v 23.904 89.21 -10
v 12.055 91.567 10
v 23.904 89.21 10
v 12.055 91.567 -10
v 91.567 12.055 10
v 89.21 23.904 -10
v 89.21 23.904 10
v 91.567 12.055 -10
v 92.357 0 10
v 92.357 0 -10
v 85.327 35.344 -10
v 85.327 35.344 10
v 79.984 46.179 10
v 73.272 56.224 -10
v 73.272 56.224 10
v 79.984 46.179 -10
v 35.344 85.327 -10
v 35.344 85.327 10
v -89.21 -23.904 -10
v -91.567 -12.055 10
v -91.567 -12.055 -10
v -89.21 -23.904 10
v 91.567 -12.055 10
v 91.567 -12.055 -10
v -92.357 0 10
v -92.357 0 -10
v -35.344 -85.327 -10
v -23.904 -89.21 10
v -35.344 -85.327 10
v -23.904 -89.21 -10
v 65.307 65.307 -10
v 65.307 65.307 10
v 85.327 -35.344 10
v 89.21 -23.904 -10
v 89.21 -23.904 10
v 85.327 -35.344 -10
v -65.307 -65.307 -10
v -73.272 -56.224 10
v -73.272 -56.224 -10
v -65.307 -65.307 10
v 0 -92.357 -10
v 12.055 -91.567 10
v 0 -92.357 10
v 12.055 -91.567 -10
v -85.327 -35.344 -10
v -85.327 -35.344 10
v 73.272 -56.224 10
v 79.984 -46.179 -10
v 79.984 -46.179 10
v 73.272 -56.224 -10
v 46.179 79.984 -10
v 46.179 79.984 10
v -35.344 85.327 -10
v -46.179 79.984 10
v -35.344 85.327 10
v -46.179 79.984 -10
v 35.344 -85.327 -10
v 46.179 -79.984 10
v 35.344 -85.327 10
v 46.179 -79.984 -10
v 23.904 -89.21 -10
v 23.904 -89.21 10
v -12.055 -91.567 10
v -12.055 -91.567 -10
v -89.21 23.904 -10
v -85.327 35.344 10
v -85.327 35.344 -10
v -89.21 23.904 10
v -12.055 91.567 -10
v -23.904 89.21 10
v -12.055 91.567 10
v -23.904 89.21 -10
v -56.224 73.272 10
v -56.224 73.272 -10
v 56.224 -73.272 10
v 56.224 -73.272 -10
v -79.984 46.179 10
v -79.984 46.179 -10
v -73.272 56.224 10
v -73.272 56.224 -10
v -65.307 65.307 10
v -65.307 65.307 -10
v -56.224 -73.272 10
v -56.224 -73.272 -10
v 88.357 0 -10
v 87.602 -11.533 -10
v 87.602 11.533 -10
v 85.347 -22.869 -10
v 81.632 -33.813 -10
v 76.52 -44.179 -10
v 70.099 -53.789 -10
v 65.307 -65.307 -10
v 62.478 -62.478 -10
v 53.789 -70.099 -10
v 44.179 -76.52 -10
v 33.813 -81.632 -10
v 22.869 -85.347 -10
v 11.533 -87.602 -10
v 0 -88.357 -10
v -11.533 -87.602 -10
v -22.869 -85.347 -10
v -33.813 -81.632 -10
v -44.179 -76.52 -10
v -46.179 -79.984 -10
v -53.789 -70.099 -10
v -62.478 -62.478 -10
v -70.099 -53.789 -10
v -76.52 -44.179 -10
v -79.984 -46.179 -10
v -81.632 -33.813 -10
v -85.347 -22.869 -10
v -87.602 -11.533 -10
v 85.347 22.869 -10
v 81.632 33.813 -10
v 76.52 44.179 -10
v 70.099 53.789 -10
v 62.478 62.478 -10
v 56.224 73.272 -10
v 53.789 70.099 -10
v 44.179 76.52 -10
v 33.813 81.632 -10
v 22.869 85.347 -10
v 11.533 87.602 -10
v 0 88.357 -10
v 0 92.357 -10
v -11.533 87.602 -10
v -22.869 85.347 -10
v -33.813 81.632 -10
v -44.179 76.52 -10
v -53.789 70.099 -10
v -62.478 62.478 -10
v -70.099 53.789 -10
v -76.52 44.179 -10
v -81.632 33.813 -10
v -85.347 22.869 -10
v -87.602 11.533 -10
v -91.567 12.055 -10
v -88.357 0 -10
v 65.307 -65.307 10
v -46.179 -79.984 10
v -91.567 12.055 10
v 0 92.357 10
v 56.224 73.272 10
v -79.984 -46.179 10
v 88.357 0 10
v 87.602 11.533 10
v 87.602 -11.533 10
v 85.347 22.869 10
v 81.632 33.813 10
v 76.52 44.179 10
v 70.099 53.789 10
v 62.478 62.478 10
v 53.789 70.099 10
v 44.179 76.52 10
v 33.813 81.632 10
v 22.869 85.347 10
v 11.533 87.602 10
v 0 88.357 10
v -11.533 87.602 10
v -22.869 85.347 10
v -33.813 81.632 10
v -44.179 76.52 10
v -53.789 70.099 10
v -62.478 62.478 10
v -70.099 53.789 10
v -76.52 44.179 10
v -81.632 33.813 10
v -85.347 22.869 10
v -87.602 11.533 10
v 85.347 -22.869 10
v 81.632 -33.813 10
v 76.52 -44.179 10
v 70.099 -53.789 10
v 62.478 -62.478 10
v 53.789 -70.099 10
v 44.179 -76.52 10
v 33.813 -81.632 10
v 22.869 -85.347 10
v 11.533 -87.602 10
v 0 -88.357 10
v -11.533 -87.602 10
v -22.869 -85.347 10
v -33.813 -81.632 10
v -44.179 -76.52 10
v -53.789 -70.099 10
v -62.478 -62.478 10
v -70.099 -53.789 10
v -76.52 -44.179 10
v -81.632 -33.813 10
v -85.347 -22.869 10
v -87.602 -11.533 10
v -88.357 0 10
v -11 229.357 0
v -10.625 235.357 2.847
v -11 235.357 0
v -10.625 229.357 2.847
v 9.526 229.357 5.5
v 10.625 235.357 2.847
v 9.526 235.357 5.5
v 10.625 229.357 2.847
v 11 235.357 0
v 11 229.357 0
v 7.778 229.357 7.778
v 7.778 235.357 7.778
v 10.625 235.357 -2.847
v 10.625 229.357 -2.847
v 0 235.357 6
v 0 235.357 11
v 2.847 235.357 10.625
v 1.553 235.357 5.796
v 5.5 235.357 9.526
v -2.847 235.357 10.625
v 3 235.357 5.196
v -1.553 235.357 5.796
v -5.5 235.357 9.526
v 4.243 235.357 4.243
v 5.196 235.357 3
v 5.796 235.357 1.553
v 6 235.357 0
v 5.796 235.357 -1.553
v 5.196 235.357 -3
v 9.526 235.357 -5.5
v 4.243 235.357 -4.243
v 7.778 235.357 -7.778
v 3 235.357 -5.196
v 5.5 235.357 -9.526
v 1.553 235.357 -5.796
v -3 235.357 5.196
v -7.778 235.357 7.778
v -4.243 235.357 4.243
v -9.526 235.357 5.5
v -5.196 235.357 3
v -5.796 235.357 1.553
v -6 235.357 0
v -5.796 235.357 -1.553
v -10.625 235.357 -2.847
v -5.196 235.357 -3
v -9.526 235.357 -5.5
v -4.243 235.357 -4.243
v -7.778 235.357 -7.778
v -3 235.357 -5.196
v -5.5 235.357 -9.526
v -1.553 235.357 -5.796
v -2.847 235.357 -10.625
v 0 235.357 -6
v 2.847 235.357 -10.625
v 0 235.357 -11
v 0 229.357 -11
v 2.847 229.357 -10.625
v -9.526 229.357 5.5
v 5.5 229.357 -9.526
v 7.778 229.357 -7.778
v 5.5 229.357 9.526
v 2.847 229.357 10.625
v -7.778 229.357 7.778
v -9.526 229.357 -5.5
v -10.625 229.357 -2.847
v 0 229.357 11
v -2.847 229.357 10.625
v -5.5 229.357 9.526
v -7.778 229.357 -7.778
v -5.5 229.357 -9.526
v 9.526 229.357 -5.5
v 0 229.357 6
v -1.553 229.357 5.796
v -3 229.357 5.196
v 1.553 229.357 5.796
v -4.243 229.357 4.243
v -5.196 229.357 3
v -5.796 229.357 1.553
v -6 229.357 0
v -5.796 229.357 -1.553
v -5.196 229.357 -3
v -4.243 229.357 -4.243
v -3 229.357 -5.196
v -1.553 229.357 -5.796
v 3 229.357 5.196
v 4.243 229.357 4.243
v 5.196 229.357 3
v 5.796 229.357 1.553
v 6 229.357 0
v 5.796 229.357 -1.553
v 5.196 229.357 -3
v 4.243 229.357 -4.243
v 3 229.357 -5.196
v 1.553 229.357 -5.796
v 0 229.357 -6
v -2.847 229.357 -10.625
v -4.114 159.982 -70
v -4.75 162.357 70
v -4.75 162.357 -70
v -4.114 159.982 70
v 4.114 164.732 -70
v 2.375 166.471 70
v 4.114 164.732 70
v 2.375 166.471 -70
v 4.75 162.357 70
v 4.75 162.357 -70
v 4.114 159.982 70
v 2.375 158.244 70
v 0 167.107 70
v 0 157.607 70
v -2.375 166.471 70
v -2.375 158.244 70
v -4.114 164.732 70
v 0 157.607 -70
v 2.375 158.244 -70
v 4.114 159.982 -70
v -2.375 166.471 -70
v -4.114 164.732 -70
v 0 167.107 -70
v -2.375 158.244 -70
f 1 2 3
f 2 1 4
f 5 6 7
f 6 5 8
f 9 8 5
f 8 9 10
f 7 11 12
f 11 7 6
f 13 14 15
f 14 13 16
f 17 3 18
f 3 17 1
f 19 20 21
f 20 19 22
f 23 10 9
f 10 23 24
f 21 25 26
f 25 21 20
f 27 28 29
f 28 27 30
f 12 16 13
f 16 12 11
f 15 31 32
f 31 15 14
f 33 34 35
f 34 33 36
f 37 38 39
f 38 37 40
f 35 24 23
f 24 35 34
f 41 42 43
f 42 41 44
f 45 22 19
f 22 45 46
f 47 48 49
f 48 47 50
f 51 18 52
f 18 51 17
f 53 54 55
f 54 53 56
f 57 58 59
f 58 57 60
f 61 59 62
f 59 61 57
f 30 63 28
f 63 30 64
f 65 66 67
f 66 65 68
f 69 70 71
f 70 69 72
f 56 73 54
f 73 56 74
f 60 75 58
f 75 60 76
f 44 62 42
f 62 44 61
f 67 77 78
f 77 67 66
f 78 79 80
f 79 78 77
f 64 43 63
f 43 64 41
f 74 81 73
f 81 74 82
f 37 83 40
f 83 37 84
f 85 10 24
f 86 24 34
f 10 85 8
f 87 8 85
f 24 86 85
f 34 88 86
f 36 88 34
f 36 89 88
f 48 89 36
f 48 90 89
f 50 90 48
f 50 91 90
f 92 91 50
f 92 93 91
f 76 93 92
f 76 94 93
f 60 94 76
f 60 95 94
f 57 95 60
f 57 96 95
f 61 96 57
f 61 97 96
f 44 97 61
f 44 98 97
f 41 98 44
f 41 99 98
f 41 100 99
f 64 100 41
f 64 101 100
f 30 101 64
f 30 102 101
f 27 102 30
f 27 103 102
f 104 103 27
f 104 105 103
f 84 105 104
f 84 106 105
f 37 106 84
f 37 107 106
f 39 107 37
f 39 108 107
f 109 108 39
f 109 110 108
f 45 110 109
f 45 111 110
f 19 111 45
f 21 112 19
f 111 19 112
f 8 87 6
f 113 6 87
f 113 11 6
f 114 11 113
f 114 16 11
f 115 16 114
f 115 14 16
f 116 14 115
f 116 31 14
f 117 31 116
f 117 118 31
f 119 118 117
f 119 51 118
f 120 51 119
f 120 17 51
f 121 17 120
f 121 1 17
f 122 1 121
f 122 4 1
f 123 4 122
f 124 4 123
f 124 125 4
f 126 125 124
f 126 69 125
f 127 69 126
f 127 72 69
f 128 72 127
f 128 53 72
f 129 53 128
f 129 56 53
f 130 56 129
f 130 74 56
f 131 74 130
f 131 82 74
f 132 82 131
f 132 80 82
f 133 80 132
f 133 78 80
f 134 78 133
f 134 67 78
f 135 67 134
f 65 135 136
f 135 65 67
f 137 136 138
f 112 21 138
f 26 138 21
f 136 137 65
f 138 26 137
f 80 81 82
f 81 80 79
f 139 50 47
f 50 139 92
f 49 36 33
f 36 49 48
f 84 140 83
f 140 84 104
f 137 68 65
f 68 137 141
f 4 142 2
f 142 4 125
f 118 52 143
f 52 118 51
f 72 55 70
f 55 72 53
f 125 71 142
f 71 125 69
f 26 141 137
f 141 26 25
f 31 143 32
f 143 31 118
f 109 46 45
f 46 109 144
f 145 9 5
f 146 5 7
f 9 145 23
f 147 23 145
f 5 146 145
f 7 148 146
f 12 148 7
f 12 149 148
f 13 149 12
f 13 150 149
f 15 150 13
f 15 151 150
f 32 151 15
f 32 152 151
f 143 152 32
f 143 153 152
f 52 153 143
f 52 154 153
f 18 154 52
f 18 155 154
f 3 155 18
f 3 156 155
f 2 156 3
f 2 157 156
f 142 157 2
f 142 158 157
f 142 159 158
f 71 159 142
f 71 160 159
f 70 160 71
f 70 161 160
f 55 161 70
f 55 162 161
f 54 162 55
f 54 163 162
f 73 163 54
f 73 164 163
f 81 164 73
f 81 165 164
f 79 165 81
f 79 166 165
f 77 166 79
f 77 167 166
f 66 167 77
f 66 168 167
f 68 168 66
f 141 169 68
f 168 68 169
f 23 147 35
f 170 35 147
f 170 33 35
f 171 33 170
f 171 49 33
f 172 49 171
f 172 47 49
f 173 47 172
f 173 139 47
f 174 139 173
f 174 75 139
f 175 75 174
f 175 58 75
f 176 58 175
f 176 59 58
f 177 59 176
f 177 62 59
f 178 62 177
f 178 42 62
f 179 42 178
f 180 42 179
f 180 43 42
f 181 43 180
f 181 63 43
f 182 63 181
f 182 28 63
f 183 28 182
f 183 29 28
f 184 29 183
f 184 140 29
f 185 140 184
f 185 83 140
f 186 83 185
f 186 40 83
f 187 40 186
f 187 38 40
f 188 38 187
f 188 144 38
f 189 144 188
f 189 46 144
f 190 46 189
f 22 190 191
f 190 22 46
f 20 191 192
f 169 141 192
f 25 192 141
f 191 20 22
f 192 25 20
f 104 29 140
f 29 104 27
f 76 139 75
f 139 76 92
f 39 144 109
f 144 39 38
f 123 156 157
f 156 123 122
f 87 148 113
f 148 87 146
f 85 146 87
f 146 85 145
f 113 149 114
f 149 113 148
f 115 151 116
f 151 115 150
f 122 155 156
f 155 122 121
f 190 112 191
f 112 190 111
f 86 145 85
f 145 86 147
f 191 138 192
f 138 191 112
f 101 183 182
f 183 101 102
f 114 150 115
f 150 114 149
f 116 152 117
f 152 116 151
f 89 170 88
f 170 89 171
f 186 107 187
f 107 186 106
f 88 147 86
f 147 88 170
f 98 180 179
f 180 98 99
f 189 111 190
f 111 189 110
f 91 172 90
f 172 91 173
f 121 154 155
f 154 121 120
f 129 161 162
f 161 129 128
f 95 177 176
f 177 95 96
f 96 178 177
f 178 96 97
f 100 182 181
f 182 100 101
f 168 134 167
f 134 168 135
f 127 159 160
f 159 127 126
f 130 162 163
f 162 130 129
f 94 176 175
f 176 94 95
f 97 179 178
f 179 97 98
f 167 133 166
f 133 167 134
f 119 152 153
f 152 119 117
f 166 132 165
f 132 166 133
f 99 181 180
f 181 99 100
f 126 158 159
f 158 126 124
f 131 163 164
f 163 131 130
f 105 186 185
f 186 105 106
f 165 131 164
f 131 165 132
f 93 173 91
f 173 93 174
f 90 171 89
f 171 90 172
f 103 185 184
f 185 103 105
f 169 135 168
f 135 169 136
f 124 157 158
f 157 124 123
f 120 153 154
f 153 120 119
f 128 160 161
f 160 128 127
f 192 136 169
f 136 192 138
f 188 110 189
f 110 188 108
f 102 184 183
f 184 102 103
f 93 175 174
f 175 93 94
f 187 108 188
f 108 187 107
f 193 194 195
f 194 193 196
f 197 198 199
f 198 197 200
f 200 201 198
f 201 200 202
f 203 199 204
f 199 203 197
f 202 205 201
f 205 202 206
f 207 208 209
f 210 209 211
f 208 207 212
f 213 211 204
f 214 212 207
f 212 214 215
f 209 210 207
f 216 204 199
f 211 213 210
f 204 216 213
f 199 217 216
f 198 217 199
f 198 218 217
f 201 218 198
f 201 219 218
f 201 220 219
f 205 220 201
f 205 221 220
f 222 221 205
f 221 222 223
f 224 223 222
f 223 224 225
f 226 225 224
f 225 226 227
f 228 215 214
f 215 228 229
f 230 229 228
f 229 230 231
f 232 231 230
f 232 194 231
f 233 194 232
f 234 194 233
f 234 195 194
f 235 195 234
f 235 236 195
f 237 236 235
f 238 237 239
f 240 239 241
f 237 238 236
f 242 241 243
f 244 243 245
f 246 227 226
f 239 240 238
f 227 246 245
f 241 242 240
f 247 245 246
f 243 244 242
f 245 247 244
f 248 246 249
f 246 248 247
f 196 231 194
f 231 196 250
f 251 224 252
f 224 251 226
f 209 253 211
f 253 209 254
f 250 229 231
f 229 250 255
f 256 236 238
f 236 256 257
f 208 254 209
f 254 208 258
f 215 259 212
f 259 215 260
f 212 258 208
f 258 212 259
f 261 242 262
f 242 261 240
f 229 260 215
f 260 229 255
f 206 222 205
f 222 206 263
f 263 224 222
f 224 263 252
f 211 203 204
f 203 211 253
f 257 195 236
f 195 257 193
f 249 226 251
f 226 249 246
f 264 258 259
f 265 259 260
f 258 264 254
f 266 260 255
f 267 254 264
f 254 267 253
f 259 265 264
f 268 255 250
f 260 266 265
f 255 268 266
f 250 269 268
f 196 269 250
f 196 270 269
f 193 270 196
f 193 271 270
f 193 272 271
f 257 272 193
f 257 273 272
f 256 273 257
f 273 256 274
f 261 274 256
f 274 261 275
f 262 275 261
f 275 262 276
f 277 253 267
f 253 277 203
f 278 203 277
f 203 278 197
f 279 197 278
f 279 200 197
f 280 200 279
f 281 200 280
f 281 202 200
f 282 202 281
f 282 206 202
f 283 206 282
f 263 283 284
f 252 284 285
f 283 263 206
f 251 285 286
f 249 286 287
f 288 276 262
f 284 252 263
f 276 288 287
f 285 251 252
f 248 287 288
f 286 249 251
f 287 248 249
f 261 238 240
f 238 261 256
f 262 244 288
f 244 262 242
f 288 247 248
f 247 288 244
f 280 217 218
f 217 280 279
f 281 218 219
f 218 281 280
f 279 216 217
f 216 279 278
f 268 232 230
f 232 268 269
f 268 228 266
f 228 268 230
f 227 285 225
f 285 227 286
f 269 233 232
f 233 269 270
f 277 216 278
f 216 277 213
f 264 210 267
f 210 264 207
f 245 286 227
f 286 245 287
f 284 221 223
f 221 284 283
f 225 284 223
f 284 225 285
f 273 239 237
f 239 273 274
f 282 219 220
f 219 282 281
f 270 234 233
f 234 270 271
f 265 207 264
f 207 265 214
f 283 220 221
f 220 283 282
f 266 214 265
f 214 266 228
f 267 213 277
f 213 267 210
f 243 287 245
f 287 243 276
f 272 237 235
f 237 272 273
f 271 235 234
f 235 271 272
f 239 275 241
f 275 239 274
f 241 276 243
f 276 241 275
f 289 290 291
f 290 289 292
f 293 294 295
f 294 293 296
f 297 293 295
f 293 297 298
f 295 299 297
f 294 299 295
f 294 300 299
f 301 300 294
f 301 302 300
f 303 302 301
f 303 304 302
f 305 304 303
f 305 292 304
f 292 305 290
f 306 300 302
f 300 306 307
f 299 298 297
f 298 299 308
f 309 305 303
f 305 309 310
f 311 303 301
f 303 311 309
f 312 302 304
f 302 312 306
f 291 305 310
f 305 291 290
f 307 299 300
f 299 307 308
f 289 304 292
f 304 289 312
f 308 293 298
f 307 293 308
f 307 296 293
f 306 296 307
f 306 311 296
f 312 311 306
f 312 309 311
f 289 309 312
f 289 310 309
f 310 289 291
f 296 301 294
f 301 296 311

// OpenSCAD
// Auto-generated by scripts/author_from_manifest.py (Phase D.3).
// Source: data/phase_d_manifest.json (sku_intent='tolco-fig82-riser-clamp-6in').
// Do not hand-edit — regenerate from the manifest.
//
// @part tolco_fig82_riser_clamp_6in
// @kind hanger
// @category hanger.riser.clamp
// @display-name "Tolco FIG 82 Riser Clamp 6\""
// @mfg nvent_tolco
// @mfg-pn FIG_82_6in
// @listing UL
// @price-usd 17.50
// @install-minutes 8
// @crew journeyman
// @param size_in number default=6 label="Size" unit="in"
// @port pipe position=[0,0,0] direction=[0,1,0] style=grooved size_in=6 role=run_a

size_in = 6.0;

function od_mm(nps) =
    nps ==   1  ? 33.4 :
    nps == 1.25 ? 42.2 :
    nps == 1.5  ? 48.3 :
    nps ==   2  ? 60.3 :
    nps == 2.5  ? 73.0 :
    nps ==   3  ? 88.9 :
    nps ==   4  ? 114.3 :
    nps ==   6  ? 168.3 :
    nps ==   8  ? 219.1 : 60.3;

od = od_mm(size_in);
ring_id = od * 1.05;
ring_od = ring_id + 8;
strap_w = 20;
rod_len = 140;

union() {
    // Ring
    difference() {
        cylinder(h = strap_w, d = ring_od, center = true, $fn = 48);
        cylinder(h = strap_w + 1, d = ring_id, center = true, $fn = 48);
    }
    // Rod up +Y
    translate([0, rod_len/2 + ring_od/2, 0])
        cylinder(h = rod_len, d = 9.5, center = true, $fn = 12);
    // Top swivel eye
    translate([0, rod_len + ring_od/2, 0])
        rotate([90, 0, 0])
        difference() {
            cylinder(h = 6, d = 22, center = true, $fn = 24);
            cylinder(h = 8, d = 12, center = true, $fn = 24);
        }
}
